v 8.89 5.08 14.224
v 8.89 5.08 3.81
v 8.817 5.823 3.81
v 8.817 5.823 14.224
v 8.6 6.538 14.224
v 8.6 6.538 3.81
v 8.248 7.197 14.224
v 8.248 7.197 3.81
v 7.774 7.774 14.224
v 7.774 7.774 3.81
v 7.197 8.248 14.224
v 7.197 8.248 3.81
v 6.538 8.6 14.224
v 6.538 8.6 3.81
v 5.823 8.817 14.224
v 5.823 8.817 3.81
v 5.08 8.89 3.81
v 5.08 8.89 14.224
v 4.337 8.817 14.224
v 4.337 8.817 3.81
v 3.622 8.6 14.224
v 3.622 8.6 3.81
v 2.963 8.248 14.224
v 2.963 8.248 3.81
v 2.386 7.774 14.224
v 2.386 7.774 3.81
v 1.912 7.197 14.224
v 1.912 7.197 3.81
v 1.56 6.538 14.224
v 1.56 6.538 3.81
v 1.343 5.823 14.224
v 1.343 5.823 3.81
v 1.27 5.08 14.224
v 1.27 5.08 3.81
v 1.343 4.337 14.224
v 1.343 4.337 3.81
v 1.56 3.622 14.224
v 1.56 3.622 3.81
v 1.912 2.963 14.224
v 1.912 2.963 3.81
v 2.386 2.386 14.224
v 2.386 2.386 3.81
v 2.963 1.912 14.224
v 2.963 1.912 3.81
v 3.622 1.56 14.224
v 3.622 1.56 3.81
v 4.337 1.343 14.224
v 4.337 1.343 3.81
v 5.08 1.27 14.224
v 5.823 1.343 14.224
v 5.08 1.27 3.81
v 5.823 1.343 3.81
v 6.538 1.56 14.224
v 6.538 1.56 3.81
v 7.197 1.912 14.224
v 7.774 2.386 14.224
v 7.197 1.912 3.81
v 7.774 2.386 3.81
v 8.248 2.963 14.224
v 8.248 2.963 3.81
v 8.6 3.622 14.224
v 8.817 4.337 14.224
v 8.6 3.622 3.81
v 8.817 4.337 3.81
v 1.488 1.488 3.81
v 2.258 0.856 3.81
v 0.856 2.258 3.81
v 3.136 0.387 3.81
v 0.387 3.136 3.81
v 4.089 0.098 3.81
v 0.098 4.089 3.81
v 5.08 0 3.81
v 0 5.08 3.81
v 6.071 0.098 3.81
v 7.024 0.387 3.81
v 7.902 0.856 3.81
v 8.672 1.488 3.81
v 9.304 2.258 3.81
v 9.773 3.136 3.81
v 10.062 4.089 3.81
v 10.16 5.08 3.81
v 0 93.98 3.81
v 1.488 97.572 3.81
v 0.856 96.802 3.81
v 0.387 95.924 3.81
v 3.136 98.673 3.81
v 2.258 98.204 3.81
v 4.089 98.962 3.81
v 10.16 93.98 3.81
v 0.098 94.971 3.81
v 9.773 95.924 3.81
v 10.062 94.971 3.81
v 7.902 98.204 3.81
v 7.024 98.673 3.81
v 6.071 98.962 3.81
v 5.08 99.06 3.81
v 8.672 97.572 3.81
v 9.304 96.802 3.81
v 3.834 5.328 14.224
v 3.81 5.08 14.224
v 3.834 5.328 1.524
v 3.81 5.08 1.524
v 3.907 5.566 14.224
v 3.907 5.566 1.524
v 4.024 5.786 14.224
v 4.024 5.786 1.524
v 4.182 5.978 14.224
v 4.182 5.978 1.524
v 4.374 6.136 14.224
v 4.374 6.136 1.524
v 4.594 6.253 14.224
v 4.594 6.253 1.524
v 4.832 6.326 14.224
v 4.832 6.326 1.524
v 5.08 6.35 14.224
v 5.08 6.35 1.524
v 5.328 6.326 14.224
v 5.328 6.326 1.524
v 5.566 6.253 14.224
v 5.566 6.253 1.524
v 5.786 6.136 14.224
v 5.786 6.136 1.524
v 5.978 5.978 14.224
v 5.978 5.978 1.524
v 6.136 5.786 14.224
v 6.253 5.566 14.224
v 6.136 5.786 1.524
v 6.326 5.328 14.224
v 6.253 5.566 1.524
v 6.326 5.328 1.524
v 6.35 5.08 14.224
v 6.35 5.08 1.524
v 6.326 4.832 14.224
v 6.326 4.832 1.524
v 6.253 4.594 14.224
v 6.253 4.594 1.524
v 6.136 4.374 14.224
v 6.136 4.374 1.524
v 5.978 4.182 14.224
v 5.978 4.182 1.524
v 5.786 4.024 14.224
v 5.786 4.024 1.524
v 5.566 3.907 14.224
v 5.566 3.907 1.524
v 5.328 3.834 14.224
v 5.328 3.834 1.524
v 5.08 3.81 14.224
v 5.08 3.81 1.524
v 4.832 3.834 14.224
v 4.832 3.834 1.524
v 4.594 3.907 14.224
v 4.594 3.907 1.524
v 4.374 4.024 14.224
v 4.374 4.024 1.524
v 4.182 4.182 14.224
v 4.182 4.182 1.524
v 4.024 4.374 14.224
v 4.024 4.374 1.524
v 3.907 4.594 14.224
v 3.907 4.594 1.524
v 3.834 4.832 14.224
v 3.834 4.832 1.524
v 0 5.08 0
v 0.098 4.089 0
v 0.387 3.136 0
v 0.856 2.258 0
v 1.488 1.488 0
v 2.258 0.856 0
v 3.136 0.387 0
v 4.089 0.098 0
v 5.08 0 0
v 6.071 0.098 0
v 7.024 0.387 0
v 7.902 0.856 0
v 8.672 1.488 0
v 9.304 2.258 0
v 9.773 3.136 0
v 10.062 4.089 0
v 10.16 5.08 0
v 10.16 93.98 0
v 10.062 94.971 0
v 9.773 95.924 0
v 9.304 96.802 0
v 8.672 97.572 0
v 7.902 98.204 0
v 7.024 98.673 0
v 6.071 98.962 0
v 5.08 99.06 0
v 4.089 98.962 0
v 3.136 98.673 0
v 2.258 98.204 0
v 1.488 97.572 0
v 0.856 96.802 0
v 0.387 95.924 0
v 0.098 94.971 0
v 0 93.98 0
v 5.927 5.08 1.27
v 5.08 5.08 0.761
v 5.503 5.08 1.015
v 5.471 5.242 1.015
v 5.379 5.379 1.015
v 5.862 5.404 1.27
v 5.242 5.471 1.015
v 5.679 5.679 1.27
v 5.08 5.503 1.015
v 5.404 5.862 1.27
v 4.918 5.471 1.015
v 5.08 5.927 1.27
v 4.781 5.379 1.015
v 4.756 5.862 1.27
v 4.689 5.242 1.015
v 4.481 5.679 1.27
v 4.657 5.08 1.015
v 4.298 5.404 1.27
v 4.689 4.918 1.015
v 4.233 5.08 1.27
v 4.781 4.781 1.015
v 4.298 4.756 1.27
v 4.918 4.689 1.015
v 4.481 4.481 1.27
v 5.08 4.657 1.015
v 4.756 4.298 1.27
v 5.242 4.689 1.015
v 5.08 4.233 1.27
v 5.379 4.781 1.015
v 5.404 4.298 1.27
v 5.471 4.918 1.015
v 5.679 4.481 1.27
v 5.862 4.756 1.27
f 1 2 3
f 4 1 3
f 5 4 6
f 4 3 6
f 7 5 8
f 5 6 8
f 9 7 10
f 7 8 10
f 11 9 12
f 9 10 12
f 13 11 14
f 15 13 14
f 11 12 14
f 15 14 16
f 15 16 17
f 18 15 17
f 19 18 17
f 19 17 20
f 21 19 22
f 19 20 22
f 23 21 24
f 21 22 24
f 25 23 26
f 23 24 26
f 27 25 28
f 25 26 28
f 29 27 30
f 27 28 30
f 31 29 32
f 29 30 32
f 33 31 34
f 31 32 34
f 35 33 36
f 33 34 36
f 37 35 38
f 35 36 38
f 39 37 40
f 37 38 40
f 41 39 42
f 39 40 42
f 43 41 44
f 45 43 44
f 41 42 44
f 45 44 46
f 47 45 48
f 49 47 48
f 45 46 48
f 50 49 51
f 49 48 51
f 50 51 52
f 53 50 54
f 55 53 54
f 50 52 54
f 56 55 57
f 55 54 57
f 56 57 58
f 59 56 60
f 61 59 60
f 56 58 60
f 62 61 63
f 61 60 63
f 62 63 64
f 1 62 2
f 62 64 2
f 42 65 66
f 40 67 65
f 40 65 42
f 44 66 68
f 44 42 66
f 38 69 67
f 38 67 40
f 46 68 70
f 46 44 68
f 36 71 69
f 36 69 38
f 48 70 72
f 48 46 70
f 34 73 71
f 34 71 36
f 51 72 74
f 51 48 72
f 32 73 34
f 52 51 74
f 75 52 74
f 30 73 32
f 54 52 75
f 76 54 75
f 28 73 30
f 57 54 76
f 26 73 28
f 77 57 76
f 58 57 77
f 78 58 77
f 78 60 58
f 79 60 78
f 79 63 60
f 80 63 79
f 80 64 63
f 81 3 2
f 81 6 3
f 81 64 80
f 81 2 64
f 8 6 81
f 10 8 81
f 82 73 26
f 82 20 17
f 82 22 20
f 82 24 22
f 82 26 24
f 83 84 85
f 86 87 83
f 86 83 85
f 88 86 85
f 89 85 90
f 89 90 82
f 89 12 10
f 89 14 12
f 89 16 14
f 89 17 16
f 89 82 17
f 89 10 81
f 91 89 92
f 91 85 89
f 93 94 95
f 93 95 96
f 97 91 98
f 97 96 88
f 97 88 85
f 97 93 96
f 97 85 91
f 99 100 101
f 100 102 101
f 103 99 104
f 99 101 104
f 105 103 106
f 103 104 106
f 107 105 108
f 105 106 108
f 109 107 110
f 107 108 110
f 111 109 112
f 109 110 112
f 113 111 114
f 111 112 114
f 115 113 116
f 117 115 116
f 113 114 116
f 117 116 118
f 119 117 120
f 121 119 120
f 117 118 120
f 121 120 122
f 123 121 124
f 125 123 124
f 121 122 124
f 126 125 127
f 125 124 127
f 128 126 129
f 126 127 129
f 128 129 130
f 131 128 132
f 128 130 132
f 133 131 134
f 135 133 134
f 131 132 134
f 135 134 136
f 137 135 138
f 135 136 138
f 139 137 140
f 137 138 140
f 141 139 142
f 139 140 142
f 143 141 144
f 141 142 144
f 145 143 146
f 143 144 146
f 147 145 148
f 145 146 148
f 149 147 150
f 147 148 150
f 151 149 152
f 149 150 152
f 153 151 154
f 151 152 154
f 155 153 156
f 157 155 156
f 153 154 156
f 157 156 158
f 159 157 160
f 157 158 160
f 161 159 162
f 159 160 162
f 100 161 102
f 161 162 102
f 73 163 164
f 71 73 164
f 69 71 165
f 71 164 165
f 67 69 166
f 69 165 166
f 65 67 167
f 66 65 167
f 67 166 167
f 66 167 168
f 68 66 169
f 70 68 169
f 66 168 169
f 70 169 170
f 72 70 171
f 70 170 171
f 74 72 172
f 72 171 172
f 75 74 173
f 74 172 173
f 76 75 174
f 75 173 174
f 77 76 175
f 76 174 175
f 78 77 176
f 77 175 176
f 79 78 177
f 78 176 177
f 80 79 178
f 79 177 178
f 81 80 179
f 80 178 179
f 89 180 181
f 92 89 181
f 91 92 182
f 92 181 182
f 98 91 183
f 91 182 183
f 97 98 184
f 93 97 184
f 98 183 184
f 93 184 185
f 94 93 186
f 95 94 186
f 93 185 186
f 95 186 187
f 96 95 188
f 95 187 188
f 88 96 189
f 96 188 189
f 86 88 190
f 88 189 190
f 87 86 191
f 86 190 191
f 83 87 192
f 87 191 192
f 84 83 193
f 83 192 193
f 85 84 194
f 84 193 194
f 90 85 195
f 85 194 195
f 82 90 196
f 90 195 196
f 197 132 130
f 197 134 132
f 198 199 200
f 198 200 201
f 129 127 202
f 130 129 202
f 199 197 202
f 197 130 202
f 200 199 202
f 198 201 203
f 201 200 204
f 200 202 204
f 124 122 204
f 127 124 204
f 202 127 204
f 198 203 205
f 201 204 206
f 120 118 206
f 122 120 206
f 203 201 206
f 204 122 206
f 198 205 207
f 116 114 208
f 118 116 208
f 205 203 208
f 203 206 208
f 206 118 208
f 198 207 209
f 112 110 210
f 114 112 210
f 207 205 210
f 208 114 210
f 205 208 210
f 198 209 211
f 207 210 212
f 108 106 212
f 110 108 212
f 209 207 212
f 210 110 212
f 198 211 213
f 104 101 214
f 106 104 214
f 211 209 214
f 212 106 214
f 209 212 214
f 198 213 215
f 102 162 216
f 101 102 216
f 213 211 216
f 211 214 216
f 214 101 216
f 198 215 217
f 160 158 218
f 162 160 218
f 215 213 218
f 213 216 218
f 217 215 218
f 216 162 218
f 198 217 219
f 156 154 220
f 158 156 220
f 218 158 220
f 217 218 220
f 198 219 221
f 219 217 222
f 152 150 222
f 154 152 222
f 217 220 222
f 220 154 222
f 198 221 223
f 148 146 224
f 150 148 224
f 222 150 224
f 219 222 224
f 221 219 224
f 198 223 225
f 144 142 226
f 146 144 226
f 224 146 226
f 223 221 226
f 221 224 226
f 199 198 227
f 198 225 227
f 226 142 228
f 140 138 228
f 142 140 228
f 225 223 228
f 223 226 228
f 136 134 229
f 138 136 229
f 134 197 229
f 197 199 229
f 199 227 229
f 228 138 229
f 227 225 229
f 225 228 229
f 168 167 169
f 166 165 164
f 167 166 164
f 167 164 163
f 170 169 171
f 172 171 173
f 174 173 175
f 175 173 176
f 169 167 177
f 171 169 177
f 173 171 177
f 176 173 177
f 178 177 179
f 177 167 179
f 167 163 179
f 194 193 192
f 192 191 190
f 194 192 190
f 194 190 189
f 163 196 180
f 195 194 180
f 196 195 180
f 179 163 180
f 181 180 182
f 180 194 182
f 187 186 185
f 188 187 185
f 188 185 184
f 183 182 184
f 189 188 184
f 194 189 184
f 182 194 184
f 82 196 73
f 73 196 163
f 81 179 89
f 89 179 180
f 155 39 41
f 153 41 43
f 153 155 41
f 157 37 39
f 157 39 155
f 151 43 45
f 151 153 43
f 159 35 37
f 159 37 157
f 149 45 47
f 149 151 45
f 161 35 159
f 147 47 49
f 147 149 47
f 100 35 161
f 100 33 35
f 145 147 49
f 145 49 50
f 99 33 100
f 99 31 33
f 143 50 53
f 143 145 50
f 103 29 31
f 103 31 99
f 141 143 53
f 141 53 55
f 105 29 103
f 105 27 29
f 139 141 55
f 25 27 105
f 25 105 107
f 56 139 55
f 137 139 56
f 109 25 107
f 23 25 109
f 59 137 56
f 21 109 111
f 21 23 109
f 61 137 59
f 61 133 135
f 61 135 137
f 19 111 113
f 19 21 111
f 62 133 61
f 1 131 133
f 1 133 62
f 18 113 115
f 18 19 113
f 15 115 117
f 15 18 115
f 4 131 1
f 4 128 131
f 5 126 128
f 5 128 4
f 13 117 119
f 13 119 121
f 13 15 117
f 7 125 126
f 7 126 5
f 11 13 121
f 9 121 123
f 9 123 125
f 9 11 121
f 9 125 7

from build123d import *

# Parameters (mm, degrees)
F1_DEPTH = 3.81
F2_R     = 3.81
F3_DEPTH = 10.414
F5_D     = 2.54
F5_DEPTH = 12.7
F5_TIP   = 0.7630929862


with BuildPart() as f1:
    # F0 (on Top) → F1 (new body)
    with BuildSketch(Plane.XY):
        with BuildLine():
            Line((0, 93.98), (0, 5.08))
            ThreePointArc((0, 5.08), (5.08, 0), (10.16, 5.08))
            Line((10.16, 5.08), (10.16, 93.98))
            ThreePointArc((10.16, 93.98), (5.08, 99.06), (0, 93.98))
        make_face()
    extrude(amount=F1_DEPTH)

    # F2 (on face) → F3 (join)
    with BuildSketch(Plane.XY.offset(3.81)):
        with Locations((5.08, 5.08)):
            Circle(F2_R)
    extrude(amount=F3_DEPTH)

    # F5
    with Locations(Plane.XY.offset(14.224)):
        with Locations((5.08, 5.08)):
            Hole(F5_D / 2, depth=F5_DEPTH)
            with Locations((0, 0, -(F5_DEPTH + F5_TIP / 2))):  # 118° drill point
                Cone(0, F5_D / 2, F5_TIP, mode=Mode.SUBTRACT)


solid = f1.part
